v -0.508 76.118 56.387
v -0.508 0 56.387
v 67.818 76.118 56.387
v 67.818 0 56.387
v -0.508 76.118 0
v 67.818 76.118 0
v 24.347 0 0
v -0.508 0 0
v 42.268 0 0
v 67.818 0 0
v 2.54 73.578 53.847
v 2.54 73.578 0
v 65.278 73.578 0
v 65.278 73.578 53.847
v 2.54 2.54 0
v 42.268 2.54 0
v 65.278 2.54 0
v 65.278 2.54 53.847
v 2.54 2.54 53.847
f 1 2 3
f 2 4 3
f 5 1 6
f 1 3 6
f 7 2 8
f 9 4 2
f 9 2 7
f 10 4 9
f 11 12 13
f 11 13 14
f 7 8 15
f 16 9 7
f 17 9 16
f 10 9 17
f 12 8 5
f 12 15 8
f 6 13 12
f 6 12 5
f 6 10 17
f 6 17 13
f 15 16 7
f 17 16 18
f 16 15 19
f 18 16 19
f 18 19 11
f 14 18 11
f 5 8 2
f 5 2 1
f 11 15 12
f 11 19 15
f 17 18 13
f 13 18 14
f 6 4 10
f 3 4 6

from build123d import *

# Parameters (mm, degrees)
F0_W       = 76.1181116104
F0_H       = 56.3871376216
F1_DEPTH   = 67.818
F2_W       = 17.9207939655
F2_H       = 17.2872282565
F3_DEPTH   = 66.802
F4_T       = -2.54
F5_W       = 17.5273697823
F5_H       = 13.1161464378
F1_FACE2_W = 76.1181116104
F1_FACE2_H = 56.3871376216
F6_DEPTH   = 0.508


with BuildPart() as f1:
    # F0 (on Right) → F1 (new body)
    with BuildSketch(Plane.YZ):
        with Locations((38.0590558052, 28.1935688108)):
            Rectangle(F0_W, F0_H)
    extrude(amount=F1_DEPTH)

    # F2 (on face) → F3 (join)
    with BuildSketch(Plane.XZ):
        with Locations((33.3073316142, 8.6436141282)):
            Rectangle(F2_W, F2_H)
    extrude(amount=-F3_DEPTH)

    # F4
    f4_openings = [f1.faces().sort_by_distance(p)[0] for p in [
        (33.909, 38.059056, 0),
    ]]
    offset(amount=F4_T, openings=f4_openings)

    # F5 (on face) + F1_face2 (on face) → F6 (join)
    with BuildSketch(Plane.YZ.offset(67.818)):
        with Locations((35.2515848354, 6.5580732189)):
            Rectangle(F5_W, F5_H)
    with BuildSketch(Plane(origin=(0, 38.0590558052, 28.1935688108), x_dir=(0, 1, 0), z_dir=(-1, 0, 0))):
        Rectangle(F1_FACE2_W, F1_FACE2_H)
    extrude(amount=-F6_DEPTH, dir=(1, 0, 0))


solid = f1.part
